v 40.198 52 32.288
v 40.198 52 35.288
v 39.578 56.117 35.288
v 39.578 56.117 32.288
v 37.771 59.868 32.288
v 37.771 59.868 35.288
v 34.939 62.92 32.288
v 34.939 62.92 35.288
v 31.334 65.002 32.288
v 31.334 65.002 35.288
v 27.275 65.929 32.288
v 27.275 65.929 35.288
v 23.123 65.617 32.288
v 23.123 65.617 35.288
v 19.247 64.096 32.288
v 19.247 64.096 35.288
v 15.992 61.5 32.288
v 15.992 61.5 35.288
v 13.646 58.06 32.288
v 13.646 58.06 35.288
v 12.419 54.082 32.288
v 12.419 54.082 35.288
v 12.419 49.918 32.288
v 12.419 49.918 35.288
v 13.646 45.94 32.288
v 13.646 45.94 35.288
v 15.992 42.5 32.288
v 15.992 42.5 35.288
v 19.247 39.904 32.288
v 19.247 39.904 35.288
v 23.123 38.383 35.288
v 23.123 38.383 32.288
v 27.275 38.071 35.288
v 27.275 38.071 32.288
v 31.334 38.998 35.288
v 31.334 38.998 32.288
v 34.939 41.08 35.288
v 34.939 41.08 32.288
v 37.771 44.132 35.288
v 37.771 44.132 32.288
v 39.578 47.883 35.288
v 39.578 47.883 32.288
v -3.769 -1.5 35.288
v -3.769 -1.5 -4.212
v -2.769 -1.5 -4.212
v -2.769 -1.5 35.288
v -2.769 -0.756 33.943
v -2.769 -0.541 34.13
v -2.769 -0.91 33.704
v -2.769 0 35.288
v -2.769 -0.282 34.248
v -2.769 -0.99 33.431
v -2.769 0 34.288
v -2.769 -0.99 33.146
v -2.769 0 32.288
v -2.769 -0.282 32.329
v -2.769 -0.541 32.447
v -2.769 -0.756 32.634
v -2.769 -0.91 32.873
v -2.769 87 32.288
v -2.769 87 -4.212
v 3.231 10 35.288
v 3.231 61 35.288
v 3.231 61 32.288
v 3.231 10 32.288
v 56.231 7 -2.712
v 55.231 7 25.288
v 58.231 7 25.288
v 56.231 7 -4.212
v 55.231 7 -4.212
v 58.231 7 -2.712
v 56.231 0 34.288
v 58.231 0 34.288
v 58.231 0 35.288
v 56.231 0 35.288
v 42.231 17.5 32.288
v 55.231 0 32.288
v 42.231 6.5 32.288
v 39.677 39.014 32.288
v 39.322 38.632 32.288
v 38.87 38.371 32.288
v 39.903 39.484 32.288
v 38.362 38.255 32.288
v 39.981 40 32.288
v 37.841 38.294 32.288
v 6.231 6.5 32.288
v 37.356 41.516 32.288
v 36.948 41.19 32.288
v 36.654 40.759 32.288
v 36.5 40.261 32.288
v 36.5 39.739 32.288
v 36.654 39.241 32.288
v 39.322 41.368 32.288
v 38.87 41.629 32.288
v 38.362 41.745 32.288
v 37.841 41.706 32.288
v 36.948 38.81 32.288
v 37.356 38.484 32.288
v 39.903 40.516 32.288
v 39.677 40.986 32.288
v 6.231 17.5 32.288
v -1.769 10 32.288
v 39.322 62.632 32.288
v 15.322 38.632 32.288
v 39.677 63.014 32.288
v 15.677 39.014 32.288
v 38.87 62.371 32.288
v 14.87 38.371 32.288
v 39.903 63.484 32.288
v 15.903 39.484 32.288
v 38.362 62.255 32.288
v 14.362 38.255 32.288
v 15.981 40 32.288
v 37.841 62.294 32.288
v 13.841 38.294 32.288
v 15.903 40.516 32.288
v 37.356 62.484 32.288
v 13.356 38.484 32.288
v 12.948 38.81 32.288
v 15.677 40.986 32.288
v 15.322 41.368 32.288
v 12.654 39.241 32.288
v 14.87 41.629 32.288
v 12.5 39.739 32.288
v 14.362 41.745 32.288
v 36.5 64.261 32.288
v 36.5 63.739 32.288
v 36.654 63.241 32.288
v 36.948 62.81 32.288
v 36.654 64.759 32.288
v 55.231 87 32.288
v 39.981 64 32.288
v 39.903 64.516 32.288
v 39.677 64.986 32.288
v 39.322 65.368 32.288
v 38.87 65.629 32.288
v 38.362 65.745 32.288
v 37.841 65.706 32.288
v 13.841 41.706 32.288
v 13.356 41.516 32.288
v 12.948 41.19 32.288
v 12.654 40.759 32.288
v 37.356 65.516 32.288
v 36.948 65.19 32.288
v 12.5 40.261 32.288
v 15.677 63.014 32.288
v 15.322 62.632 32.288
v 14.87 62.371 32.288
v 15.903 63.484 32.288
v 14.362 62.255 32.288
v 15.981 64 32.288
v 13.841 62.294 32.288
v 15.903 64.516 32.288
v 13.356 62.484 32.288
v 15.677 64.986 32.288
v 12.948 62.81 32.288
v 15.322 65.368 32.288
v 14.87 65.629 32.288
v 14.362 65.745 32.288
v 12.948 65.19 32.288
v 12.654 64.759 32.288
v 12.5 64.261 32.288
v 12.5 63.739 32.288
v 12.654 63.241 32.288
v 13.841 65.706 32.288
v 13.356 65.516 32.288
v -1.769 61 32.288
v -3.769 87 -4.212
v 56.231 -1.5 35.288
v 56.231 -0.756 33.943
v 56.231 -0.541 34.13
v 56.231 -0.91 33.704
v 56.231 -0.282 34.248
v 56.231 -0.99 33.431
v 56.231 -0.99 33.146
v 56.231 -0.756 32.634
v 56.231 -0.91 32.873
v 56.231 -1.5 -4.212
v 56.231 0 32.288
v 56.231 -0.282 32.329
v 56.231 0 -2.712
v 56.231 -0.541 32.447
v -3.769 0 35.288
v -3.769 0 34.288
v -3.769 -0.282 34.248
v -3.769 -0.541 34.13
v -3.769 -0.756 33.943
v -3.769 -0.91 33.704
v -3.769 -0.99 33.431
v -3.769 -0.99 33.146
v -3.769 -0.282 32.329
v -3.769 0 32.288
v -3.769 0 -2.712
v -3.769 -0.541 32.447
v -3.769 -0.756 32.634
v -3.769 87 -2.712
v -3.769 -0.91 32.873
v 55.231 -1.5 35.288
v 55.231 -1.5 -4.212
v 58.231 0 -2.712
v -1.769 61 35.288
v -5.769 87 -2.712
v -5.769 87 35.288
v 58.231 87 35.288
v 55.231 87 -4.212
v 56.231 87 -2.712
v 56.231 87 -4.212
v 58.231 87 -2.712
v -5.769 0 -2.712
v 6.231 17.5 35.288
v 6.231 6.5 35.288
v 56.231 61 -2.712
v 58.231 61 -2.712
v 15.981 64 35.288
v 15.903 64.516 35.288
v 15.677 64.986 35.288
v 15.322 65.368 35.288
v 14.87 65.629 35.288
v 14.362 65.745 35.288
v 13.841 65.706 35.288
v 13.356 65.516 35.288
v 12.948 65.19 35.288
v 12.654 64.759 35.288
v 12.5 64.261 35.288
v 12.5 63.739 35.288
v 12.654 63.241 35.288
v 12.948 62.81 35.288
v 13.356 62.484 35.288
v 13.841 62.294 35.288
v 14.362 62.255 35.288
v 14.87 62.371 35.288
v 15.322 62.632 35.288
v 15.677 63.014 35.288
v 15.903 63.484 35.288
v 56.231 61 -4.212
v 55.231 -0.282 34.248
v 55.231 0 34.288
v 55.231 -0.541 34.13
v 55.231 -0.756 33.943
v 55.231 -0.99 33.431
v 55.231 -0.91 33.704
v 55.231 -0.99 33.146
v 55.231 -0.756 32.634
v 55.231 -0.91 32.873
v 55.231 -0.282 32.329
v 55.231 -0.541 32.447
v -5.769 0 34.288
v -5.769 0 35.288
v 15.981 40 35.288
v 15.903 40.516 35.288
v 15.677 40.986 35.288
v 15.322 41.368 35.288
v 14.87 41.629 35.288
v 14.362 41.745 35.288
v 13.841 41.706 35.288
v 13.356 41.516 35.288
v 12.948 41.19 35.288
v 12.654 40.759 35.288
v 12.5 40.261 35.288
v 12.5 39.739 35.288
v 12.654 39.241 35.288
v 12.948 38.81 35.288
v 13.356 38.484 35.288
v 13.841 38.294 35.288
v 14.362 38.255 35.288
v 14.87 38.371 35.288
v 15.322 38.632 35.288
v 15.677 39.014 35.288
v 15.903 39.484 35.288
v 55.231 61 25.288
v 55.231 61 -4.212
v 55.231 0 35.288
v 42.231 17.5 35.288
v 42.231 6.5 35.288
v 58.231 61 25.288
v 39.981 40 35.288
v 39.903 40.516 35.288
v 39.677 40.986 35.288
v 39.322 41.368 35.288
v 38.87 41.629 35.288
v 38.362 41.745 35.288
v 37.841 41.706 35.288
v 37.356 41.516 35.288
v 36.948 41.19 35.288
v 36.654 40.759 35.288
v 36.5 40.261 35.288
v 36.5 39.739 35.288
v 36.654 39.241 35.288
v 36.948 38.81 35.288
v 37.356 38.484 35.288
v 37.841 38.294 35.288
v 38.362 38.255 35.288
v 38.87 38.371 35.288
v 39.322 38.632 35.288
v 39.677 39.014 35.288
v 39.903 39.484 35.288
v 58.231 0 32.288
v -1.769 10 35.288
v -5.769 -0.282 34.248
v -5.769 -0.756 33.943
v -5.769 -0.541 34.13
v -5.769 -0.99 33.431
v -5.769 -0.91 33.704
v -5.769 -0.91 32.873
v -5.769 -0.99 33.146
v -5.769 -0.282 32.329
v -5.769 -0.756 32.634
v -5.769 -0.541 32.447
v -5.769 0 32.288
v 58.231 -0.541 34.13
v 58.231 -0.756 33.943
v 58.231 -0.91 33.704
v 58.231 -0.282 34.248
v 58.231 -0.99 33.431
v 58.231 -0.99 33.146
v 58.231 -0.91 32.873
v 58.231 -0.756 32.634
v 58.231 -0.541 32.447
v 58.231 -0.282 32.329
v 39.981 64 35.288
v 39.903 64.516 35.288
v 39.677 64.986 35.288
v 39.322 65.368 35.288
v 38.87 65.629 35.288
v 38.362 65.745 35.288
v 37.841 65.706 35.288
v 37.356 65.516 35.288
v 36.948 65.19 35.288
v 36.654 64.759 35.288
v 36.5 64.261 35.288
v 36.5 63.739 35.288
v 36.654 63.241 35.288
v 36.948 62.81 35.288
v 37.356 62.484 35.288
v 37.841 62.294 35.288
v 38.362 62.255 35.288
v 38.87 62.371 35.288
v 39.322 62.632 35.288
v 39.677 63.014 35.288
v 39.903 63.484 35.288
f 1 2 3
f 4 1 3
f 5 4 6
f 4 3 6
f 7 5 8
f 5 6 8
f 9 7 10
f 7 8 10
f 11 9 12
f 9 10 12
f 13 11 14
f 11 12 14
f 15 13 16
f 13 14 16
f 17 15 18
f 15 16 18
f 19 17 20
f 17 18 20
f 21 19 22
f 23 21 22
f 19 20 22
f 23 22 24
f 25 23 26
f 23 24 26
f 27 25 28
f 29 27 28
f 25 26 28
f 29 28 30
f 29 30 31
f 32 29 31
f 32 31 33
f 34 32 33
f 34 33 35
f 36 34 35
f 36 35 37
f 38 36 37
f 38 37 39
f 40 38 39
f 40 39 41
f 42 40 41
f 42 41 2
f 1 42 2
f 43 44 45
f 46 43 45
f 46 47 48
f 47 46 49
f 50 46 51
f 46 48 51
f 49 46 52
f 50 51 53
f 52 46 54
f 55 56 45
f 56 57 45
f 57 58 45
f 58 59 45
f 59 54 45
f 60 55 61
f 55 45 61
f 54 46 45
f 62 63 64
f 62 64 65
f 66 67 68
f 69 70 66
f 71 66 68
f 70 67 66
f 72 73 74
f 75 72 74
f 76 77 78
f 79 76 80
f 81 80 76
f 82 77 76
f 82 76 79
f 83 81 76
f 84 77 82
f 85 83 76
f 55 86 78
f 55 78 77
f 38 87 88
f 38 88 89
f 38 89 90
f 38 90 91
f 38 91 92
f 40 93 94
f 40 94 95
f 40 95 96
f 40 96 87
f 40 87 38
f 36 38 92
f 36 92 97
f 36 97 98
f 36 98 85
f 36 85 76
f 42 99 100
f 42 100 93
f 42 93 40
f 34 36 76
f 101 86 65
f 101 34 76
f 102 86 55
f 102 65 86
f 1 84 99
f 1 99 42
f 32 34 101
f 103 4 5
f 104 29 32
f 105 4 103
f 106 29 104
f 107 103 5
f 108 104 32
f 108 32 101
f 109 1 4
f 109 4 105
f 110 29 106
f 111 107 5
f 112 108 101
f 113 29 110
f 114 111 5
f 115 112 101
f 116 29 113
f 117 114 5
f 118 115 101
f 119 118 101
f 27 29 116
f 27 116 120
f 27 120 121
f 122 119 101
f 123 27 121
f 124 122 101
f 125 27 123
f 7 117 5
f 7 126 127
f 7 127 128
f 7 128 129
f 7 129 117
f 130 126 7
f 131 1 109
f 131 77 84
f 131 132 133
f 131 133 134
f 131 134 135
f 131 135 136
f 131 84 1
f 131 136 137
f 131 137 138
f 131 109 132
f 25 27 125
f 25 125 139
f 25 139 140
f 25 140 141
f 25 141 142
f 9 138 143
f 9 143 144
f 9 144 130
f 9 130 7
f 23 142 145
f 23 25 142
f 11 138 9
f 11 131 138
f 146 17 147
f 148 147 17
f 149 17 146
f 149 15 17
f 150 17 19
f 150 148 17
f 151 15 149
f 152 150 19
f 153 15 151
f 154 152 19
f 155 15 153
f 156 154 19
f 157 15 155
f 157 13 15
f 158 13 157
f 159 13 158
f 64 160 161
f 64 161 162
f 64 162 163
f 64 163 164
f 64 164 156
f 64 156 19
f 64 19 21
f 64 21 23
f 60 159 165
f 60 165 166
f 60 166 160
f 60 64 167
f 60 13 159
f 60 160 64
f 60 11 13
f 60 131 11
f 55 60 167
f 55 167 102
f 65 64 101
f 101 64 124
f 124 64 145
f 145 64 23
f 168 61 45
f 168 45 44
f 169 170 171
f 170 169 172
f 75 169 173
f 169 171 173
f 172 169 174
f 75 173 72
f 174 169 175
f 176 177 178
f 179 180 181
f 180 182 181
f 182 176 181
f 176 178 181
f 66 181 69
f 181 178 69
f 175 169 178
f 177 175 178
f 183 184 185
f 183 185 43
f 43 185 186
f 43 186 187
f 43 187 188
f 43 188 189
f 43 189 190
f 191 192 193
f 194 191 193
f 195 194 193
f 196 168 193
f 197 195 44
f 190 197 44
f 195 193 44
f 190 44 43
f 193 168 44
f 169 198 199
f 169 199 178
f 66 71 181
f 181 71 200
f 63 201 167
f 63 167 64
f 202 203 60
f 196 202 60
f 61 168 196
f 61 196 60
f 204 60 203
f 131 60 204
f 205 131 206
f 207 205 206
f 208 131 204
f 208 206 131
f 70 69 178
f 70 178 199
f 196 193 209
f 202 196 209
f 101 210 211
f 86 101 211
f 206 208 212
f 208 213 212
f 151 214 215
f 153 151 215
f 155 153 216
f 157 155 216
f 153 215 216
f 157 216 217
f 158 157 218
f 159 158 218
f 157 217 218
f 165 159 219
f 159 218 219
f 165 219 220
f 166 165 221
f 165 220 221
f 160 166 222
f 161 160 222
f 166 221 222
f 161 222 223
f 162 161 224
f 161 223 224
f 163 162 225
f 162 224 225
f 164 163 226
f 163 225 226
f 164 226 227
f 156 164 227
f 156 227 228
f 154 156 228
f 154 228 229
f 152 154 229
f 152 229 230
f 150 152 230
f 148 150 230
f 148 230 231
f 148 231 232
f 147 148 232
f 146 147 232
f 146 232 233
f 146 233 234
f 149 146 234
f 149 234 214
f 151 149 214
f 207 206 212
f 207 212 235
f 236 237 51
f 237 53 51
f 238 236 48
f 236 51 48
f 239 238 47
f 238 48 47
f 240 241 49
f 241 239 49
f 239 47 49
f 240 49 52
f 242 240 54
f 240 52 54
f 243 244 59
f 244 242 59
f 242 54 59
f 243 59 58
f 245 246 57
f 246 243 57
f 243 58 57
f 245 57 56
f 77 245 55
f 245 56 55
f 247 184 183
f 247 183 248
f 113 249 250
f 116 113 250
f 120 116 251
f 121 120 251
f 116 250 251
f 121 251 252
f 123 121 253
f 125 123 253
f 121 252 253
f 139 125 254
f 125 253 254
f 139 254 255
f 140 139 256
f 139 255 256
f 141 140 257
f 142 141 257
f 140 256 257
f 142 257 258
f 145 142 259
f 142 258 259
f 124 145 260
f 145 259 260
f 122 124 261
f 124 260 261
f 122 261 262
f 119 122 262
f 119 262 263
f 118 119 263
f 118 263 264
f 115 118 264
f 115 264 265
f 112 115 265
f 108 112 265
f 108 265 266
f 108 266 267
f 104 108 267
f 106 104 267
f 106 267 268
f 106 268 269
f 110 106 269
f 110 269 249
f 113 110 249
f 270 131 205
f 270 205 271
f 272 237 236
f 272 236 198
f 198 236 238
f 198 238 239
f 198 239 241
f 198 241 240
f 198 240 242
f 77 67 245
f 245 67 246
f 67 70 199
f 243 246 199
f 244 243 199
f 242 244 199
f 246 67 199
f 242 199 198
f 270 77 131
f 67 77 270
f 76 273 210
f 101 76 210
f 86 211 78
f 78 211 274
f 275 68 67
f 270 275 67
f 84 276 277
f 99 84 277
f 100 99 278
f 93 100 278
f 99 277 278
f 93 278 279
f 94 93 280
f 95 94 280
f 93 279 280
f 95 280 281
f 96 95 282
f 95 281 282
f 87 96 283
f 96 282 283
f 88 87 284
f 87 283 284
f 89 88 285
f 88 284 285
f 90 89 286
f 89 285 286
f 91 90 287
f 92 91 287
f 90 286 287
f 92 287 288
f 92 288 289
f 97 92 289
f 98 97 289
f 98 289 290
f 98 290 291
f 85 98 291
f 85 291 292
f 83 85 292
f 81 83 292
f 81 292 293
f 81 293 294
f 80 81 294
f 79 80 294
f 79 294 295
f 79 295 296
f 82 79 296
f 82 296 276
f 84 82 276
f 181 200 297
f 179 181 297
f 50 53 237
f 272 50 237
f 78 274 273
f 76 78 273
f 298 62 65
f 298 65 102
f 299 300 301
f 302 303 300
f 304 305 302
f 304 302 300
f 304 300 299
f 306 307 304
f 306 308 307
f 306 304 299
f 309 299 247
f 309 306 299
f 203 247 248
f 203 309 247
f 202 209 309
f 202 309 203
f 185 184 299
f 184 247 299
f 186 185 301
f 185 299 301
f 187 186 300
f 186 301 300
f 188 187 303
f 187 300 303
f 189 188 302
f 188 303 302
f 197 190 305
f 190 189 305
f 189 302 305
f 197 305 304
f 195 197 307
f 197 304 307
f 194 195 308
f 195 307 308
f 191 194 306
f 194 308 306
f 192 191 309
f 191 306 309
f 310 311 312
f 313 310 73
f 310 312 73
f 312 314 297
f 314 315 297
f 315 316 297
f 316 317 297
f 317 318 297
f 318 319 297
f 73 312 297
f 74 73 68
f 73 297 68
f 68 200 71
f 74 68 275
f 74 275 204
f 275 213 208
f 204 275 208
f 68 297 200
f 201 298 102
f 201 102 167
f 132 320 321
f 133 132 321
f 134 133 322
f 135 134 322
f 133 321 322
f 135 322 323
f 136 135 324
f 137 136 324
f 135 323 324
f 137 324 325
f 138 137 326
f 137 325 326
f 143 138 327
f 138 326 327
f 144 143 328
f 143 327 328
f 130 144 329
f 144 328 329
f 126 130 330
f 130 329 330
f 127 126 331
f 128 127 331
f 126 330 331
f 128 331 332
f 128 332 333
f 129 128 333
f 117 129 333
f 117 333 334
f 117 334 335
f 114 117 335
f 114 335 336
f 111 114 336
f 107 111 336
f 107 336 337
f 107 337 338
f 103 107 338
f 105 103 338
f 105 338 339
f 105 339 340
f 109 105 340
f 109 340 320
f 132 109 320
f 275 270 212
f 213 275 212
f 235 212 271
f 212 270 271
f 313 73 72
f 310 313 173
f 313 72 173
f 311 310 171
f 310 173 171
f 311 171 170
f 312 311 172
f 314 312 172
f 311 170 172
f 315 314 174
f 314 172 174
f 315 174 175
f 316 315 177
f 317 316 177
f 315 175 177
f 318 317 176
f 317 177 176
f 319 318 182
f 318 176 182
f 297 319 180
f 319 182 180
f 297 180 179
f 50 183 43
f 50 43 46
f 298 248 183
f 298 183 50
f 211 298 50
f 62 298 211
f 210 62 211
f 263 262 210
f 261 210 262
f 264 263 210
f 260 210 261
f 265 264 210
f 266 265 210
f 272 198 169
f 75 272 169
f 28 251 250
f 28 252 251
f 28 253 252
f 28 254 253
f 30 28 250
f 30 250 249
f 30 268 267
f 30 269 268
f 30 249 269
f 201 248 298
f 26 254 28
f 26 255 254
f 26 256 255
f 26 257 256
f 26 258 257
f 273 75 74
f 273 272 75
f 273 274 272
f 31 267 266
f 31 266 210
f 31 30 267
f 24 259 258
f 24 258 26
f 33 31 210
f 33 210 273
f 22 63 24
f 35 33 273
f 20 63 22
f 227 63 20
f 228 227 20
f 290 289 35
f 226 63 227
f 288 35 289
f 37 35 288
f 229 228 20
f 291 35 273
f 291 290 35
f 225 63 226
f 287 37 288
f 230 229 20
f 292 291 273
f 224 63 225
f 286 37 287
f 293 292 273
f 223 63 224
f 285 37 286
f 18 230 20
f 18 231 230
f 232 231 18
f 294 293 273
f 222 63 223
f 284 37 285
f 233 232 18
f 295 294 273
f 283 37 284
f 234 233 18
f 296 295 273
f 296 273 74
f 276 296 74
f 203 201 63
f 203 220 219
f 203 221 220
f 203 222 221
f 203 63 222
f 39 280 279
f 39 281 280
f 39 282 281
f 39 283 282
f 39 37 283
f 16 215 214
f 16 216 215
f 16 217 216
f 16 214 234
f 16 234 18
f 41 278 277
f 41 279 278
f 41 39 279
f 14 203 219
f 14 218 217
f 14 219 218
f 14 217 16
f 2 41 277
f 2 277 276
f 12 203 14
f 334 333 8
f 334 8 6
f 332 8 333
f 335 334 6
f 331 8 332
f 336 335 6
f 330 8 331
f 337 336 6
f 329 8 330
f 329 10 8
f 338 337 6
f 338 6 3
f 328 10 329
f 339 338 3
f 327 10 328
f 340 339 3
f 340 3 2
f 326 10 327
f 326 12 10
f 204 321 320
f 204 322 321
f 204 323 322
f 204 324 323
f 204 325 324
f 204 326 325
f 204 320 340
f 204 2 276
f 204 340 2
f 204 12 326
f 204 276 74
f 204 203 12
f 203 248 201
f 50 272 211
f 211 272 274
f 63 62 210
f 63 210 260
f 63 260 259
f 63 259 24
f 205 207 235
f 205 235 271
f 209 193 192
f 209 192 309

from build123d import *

# Parameters (mm, degrees)
EXTRUDE_1_DEPTH      = 88
SKETCH_3_W           = 1.5000000000000007
SKETCH_3_H           = 22
SKETCH_3_W_2         = 1.5
EXTRUDE_2_DEPTH      = 3
CUT_EXTRUDE_1_DEPTH  = 13.000000000000005
CUT_EXTRUDE_2_DEPTH  = 6
SKETCH_7_W           = 1.5
SKETCH_7_H           = 3
SKETCH_7_W_2         = 1.5000000000000007
EXTRUDE_4_DEPTH      = 3
EXTRUDE_START        = -62
SKETCH_6_R           = 1.0000000000000016
EXTRUDE_7_DEPTH      = 62
EXTRUDE_START_2      = 1
EXTRUDE_8_DEPTH      = 1
EXTRUDE_9_DEPTH      = 1
EXTRUDE_10_DEPTH     = 1
EXTRUDE_11_DEPTH     = 1
EXTRUDE_12_DEPTH     = 1
CUT_EXTRUDE_3_DEPTH  = 1
CUT_EXTRUDE_START    = -1
CUT_EXTRUDE_4_DEPTH  = 1
CUT_EXTRUDE_5_DEPTH  = 1
SKETCH_16_W          = 1.500000000000007
SKETCH_16_H          = 25
CUT_EXTRUDE_6_DEPTH  = 1
SKETCH_17_W          = 1.5000000000000004
SKETCH_17_H          = 90
CUT_EXTRUDE_7_DEPTH  = 1
CUT_EXTRUDE_8_DEPTH  = 1
SKETCH_19_W          = 1.500000000000007
SKETCH_19_H          = 26.999999999999993
CUT_EXTRUDE_9_DEPTH  = 1
EXTRUDE_13_DEPTH     = 1
CUT_EXTRUDE_10_DEPTH = 1
CUT_EXTRUDE_11_DEPTH = 1
CUT_EXTRUDE_12_DEPTH = 0.5
CUT_EXTRUDE_13_DEPTH = 0.5
CUT_EXTRUDE_14_DEPTH = 0.5
SKETCH_26_W          = 1.500000000000007
SKETCH_26_H          = 25.999999999999993
CUT_EXTRUDE_15_DEPTH = 0.5
CUT_EXTRUDE_16_DEPTH = 0.5
CUT_EXTRUDE_START_2  = -0.5
CUT_EXTRUDE_17_DEPTH = 0.5
SKETCH_29_W          = 1.4999999999999991
SKETCH_29_H          = 25.999999999999993
CUT_EXTRUDE_18_DEPTH = 0.5
CUT_EXTRUDE_19_DEPTH = 0.5
EXTRUDE_14_DEPTH     = 15
CUT_EXTRUDE_20_DEPTH = 15
SKETCH_33_R          = 1.0000000000000016
CUT_EXTRUDE_21_DEPTH = 114.62339335608438
CUT_EXTRUDE_22_DEPTH = 2
EXTRUDE_15_DEPTH     = 26.00000000000001
EXTRUDE_16_DEPTH     = 26.00000000000001
SKETCH_37_W          = 2.0000000000000004
SKETCH_37_H          = 87
EXTRUDE_17_DEPTH     = 26.00000000000001
EXTRUDE_18_DEPTH     = 28.000000000000025
SKETCH_40_R          = 1.7500000000000038
SKETCH_40_R_2        = 13.967693526781561
SKETCH_40_R_3        = 4.000000000000002
SKETCH_40_R_4        = 4
CUT_EXTRUDE_23_DEPTH = 28.000000000000025
CUT_EXTRUDE_25_DEPTH = 22.000000000000007
SKETCH_43_W          = 11.493047427713066
SKETCH_43_H          = 3
SKETCH_43_W_2        = 11.493047427713059
EXTRUDE_19_DEPTH     = 73.00000000000001
CUT_EXTRUDE_26_DEPTH = 73.00000000000001
EXTRUDE_START_3      = -64
SKETCH_45_R          = 0.9999999999999983
EXTRUDE_21_DEPTH     = 64


with BuildPart() as part:
    # 草图2 → 凸台-拉伸1 (new body)
    with BuildSketch(Plane(origin=(0, 0, 0), x_dir=(1, 0, 0), z_dir=(0, 1, 0))):
        Polygon((-3.2692307692307776, 5.711538461538465), (-3.269230769230777, 2.711538461538465), (-4.769230769230776, 2.711538461538465), (-4.7692307692307745, -19.288461538461533), (57.230769230769226, -19.288461538461533), (57.230769230769226, 2.7115384615384723), (55.73076923076922, 2.7115384615384723), (55.73076923076922, 5.711538461538472), (54.23076923076922, 5.711538461538473), (54.23076923076922, -16.288461538461526), (-1.7692307692307774, -16.288461538461533), (-1.7692307692307776, 5.711538461538466), align=None)
    extrude(amount=EXTRUDE_1_DEPTH)

    # 草图3 → 凸台-拉伸2 (add)
    with BuildSketch(Plane.XZ):
        with Locations((-2.5192307692307776, 5.288461538461534)):
            Rectangle(SKETCH_3_W, SKETCH_3_H)
        with Locations((54.98076923076922, 5.288461538461534)):
            Rectangle(SKETCH_3_W_2, SKETCH_3_H)
    extrude(amount=EXTRUDE_2_DEPTH)

    # 草图4 → 切除-拉伸1 (cut)
    with BuildSketch(Plane(origin=(0, 0, -2.7115384615384723), x_dir=(-1, 0, 0), z_dir=(0, 0, -1))):
        Polygon((-55.73076923076922, 16.689999999999998), (-54.23076923076922, 16.69), (-54.23076923076922, 44.69), (-55.73076923076922, 44.69), align=None)
    extrude(amount=CUT_EXTRUDE_1_DEPTH, mode=Mode.SUBTRACT)

    # 草图5 → 切除-拉伸2 (cut, symmetric)
    with BuildSketch(Plane(origin=(0, 0, -2.7115384615384723), x_dir=(-1, 0, 0), z_dir=(0, 0, -1))):
        Polygon((-57.230769230769226, 8.999999999999995), (-54.23076923076922, 8.999999999999998), (-54.23076923076922, 61), (-57.230769230769226, 61), align=None)
    extrude(amount=CUT_EXTRUDE_2_DEPTH, both=True, mode=Mode.SUBTRACT)

    # 草图7 → 凸台-拉伸4 (add)
    with BuildSketch(Plane.XY.offset(16.288461538461533)):
        with Locations((54.98076923076922, -1.5)):
            Rectangle(SKETCH_7_W, SKETCH_7_H)
        with Locations((-2.5192307692307776, -1.5)):
            Rectangle(SKETCH_7_W_2, SKETCH_7_H)
    extrude(amount=EXTRUDE_4_DEPTH)

    # 草图6 → 凸台-拉伸7 (add)
    with BuildSketch(Plane.ZY.offset(4.769230769230776).offset(EXTRUDE_START)):
        with Locations((17.28846154, 0)):
            Circle(SKETCH_6_R)
    extrude(amount=EXTRUDE_7_DEPTH)

    # 草图8 → 凸台-拉伸8 (add)
    with BuildSketch(Plane(origin=(57.230769230769226, 0, 0), x_dir=(0, 0, -1), z_dir=(1, 0, 0)).offset(EXTRUDE_START_2)):
        with BuildLine():
            Line((-19.288461538461533, 0), (-18.28846154, 0))
            ThreePointArc((-18.28846154, 0), (-17.288461539999997, -1.0000000000000036), (-16.288461539999997, 0))
            Line((-16.288461539999997, 0), (2.7115384615384723, 0))
            Line((2.7115384615384723, 0), (2.7115384615384723, 8.999999999999995))
            Line((2.7115384615384723, 8.999999999999995), (-3.288461538461528, 8.999999999999995))
            Line((-3.288461538461528, 8.999999999999995), (-3.288461538461528, 61))
            Line((-3.288461538461528, 61), (2.711538461538472, 61))
            Line((2.711538461538472, 61), (2.7115384615384723, 88))
            Line((2.7115384615384723, 88), (-19.288461538461533, 88))
            Line((-19.288461538461533, 88), (-19.288461538461533, 0))
        make_face()
    extrude(amount=-EXTRUDE_8_DEPTH)

    # 草图9 → 凸台-拉伸9 (add)
    with BuildSketch(Plane.ZY.offset(4.769230769230776)):
        with BuildLine():
            Line((-2.7115384615384652, 0), (16.28846154, 0))
            ThreePointArc((16.28846154, 0), (17.28846154, -1), (18.288461540000004, 0))
            Line((18.288461540000004, 0), (19.288461538461533, 0))
            Line((19.288461538461533, 0), (19.288461538461533, 88))
            Line((19.288461538461533, 88), (-2.7115384615384652, 88))
            Line((-2.7115384615384652, 88), (-2.7115384615384652, 0))
        make_face()
    extrude(amount=EXTRUDE_9_DEPTH)

    # 草图10 → 凸台-拉伸10 (add)
    with BuildSketch(Plane.ZY.offset(3.2692307692307767)):
        with BuildLine():
            Line((19.288461538461533, 0), (18.288461540000004, 0))
            ThreePointArc((18.288461540000004, 0), (17.28846154, -1), (16.28846154, 1.2e-16))
            Line((16.28846154, 1.2e-16), (-2.7115384615384652, 0))
            Line((-2.7115384615384652, 0), (-2.7115384615384652, 88))
            Line((-2.7115384615384652, 88), (-5.711538461538466, 88))
            Line((-5.711538461538466, 88), (-5.711538461538466, -3))
            Line((-5.711538461538466, -3), (19.288461538461533, -3))
            Line((19.288461538461533, -3), (19.288461538461533, 0))
        make_face()
    extrude(amount=EXTRUDE_10_DEPTH)

    # 草图11 → 凸台-拉伸11 (add)
    with BuildSketch(Plane(origin=(55.73076923076922, 0, 0), x_dir=(0, 0, -1), z_dir=(1, 0, 0)).offset(EXTRUDE_START_2)):
        with BuildLine():
            Line((2.7115384615384723, 0), (-16.288461539999997, 0))
            ThreePointArc((-16.288461539999997, 0), (-17.288461539999997, -1.0000000000000036), (-18.28846154, 1.2e-16))
            Line((-18.28846154, 1.2e-16), (-19.288461538461533, 0))
            Line((-19.288461538461533, 0), (-19.288461538461533, -3))
            Line((-19.288461538461533, -3), (5.711538461538465, -3))
            Line((5.711538461538465, -3), (5.711538461538476, 8.999999999999995))
            Line((5.711538461538476, 8.999999999999995), (2.7115384615384723, 8.999999999999996))
            Line((2.7115384615384723, 8.999999999999996), (2.7115384615384723, 0))
        make_face()
    extrude(amount=-EXTRUDE_11_DEPTH)

    # 草图12 → 凸台-拉伸12 (add)
    with BuildSketch(Plane(origin=(55.73076923076922, 0, 0), x_dir=(0, 0, -1), z_dir=(1, 0, 0))):
        Polygon((2.7115384615384723, 88), (2.7115384615384723, 61), (5.711538461538476, 61), (5.711538461538472, 88), align=None)
    extrude(amount=EXTRUDE_12_DEPTH)

    # 草图13 → 切除-拉伸3 (cut)
    with BuildSketch(Plane(origin=(-1.7692307692307776, 0, 3e-17), x_dir=(-2e-17, 0, -1), z_dir=(1, 0, -2e-17))):
        with BuildLine():
            Line((-16.288461538461533, 88), (-16.28846154, 0))
            ThreePointArc((-16.28846154, 0), (-17.28846154, -1.0000000000000036), (-18.288461540000004, 1.2e-16))
            Line((-18.288461540000004, 1.2e-16), (-19.288461538461533, 0))
            Line((-19.288461538461533, 0), (-19.288461538461533, -3))
            Line((-19.288461538461533, -3), (5.711538461538465, -3))
            Line((5.711538461538465, -3), (5.711538461538466, 88))
            Line((5.711538461538466, 88), (-16.288461538461533, 88))
        make_face()
    extrude(amount=-CUT_EXTRUDE_3_DEPTH, mode=Mode.SUBTRACT)

    # 草图14 → 切除-拉伸4 (cut)
    with BuildSketch(Plane.ZY.offset(-54.23076923076922).offset(CUT_EXTRUDE_START)):
        with BuildLine():
            Line((19.288461538461533, 0), (18.28846154, 0))
            ThreePointArc((18.28846154, 0), (17.288461539999997, -1.0000000003846203), (16.288461539615376, 1.2e-16))
            Line((16.288461539615376, 1.2e-16), (16.288461538461526, 88))
            Line((16.288461538461526, 88), (-5.711538461538473, 88))
            Line((-5.711538461538473, 88), (-5.711538461538476, 61))
            Line((-5.711538461538476, 61), (3.288461538461528, 61))
            Line((3.288461538461528, 61), (3.288461538461528, 8.999999999999998))
            Line((3.288461538461528, 8.999999999999998), (-5.711538461538476, 8.999999999999998))
            Line((-5.711538461538476, 8.999999999999998), (-5.711538461538465, -3))
            Line((-5.711538461538465, -3), (19.288461538461533, -3))
            Line((19.288461538461533, -3), (19.288461538461533, 0))
        make_face()
    extrude(amount=CUT_EXTRUDE_4_DEPTH, mode=Mode.SUBTRACT)

    # 草图15 → 切除-拉伸5 (cut)
    with BuildSketch(Plane.XZ.offset(3)):
        Polygon((-2.7692307692307776, -5.711538461538465), (-2.769230769230777, 19.288461538461533), (-4.2692307692307745, 19.288461538461533), (-4.269230769230778, -5.711538461538465), align=None)
    extrude(amount=-CUT_EXTRUDE_5_DEPTH, mode=Mode.SUBTRACT)

    # 草图16 → 切除-拉伸6 (cut)
    with BuildSketch(Plane.XZ.offset(3)):
        with Locations((55.980769230769226, 6.788461538461534)):
            Rectangle(SKETCH_16_W, SKETCH_16_H)
    extrude(amount=-CUT_EXTRUDE_6_DEPTH, mode=Mode.SUBTRACT)

    # 草图17 → 切除-拉伸7 (cut)
    with BuildSketch(Plane(origin=(-3.3e-15, 0, -5.711538461538467), x_dir=(-1, 0, 5.8e-16), z_dir=(-5.8e-16, 0, -1))):
        with Locations((3.5192307692307745, 43)):
            Rectangle(SKETCH_17_W, SKETCH_17_H)
    extrude(amount=-CUT_EXTRUDE_7_DEPTH, mode=Mode.SUBTRACT)

    # 草图18 → 切除-拉伸8 (cut)
    with BuildSketch(Plane(origin=(3.3e-15, 0, -5.711538461538505), x_dir=(-1, 0, -5.8e-16), z_dir=(5.8e-16, 0, -1))):
        Polygon((-56.730769230769226, -2), (-55.23076923076922, -2), (-55.23076923076922, 8.999999999999998), (-56.730769230769226, 8.999999999999995), align=None)
    extrude(amount=-CUT_EXTRUDE_8_DEPTH, mode=Mode.SUBTRACT)

    # 草图19 → 切除-拉伸9 (cut)
    with BuildSketch(Plane(origin=(3.3e-15, 0, -5.711538461538505), x_dir=(-1, 0, -5.8e-16), z_dir=(5.8e-16, 0, -1))):
        with Locations((-55.980769230769226, 74.5)):
            Rectangle(SKETCH_19_W, SKETCH_19_H)
    extrude(amount=-CUT_EXTRUDE_9_DEPTH, mode=Mode.SUBTRACT)

    # 草图20 → 凸台-拉伸13 (add)
    with BuildSketch(Plane.XY.offset(19.288461538461533)):
        Polygon((55.23076923076922, -2), (56.730769230769226, -2), (56.730769230769226, 0), (58.230769230769226, 0), (58.230769230769226, 88), (-5.7692307692307745, 88), (-5.7692307692307745, 0), (-4.2692307692307745, 0), (-4.2692307692307745, -2), (-2.769230769230777, -2), (-2.769230769230777, 0), (55.23076923076922, 0), align=None)
    extrude(amount=EXTRUDE_13_DEPTH)

    # 草图21 → 切除-拉伸10 (cut)
    with BuildSketch(Plane(origin=(2.02e-15, 0, 16.288461538461533), x_dir=(-1, 0, 1.2e-16), z_dir=(-1.2e-16, 0, -1))):
        Polygon((-55.23076923076922, 1.2e-16), (2.7692307692307794, 0), (2.7692307692307794, 88), (-55.23076923076922, 88), align=None)
    extrude(amount=-CUT_EXTRUDE_10_DEPTH, mode=Mode.SUBTRACT)

    # 草图22 → 切除-拉伸11 (cut)
    with BuildSketch(Plane(origin=(0, 88, 0), x_dir=(1, 0, 0), z_dir=(0, 1, 0))):
        Polygon((55.23076923076922, 4.711538461538472), (55.23076923076922, -17.288461538461526), (-2.769230769230777, -17.288461538461533), (-2.769230769230777, 4.711538461538465), (-4.269230769230777, 4.711538461538464), (-4.269230769230776, 2.711538461538465), (-5.769230769230776, 2.711538461538465), (-5.7692307692307745, -20.288461538461533), (58.230769230769226, -20.288461538461533), (58.230769230769226, 2.7115384615384723), (56.730769230769226, 2.7115384615384723), (56.730769230769226, 4.7115384615384714), align=None)
    extrude(amount=-CUT_EXTRUDE_11_DEPTH, mode=Mode.SUBTRACT)

    # 草图23 → 切除-拉伸12 (cut)
    with BuildSketch(Plane.XZ.offset(2)):
        Polygon((-4.2692307692307745, 20.288461538461533), (-4.269230769230777, -4.711538461538464), (-2.7692307692307776, -4.711538461538465), (-2.769230769230777, 20.288461538461533), align=None)
    extrude(amount=-CUT_EXTRUDE_12_DEPTH, mode=Mode.SUBTRACT)

    # 草图24 → 切除-拉伸13 (cut)
    with BuildSketch(Plane.XZ.offset(2)):
        Polygon((55.23076923076922, 20.288461538461533), (55.23076923076922, -4.711538461538472), (56.730769230769226, -4.7115384615384714), (56.730769230769226, 20.288461538461533), align=None)
    extrude(amount=-CUT_EXTRUDE_13_DEPTH, mode=Mode.SUBTRACT)

    # 草图25 → 切除-拉伸14 (cut)
    with BuildSketch(Plane(origin=(-2.72e-15, 0, -4.711538461538467), x_dir=(-1, 0, 5.8e-16), z_dir=(-5.8e-16, 0, -1))):
        Polygon((2.7692307692307745, 87), (2.769230769230775, -1.5), (4.2692307692307745, -1.5), (4.2692307692307745, 87), align=None)
    extrude(amount=-CUT_EXTRUDE_14_DEPTH, mode=Mode.SUBTRACT)

    # 草图26 → 切除-拉伸15 (cut)
    with BuildSketch(Plane(origin=(2.72e-15, 0, -4.711538461538505), x_dir=(-1, 0, -5.8e-16), z_dir=(5.8e-16, 0, -1))):
        with Locations((-55.980769230769226, 74)):
            Rectangle(SKETCH_26_W, SKETCH_26_H)
    extrude(amount=-CUT_EXTRUDE_15_DEPTH, mode=Mode.SUBTRACT)

    # 草图27 → 切除-拉伸16 (cut)
    with BuildSketch(Plane(origin=(2.72e-15, 0, -4.711538461538505), x_dir=(-1, 0, -5.8e-16), z_dir=(5.8e-16, 0, -1))):
        Polygon((-56.730769230769226, 8.999999999999995), (-56.730769230769226, -1.5), (-55.23076923076922, -1.5), (-55.23076923076922, 8.999999999999998), align=None)
    extrude(amount=-CUT_EXTRUDE_16_DEPTH, mode=Mode.SUBTRACT)

    # 草图28 → 切除-拉伸17 (cut)
    with BuildSketch(Plane.ZY.offset(4.269230769230777).offset(CUT_EXTRUDE_START_2)):
        with BuildLine():
            Line((-2.7115384615384652, 87), (-4.211538461538465, 87))
            Line((-4.211538461538465, 87), (-4.211538461538465, -1.5))
            Line((-4.211538461538465, -1.5), (20.288461538461533, -1.5))
            Line((20.288461538461533, -1.5), (20.288461538461533, 0))
            Line((20.288461538461533, 0), (18.288461540000004, 0))
            ThreePointArc((18.288461540000004, 0), (17.28846154, -1), (16.28846154, 1.2e-16))
            Line((16.28846154, 1.2e-16), (-2.7115384615384652, 0))
            Line((-2.7115384615384652, 0), (-2.7115384615384652, 87))
        make_face()
    extrude(amount=CUT_EXTRUDE_17_DEPTH, mode=Mode.SUBTRACT)

    # 草图29 → 切除-拉伸18 (cut)
    with BuildSketch(Plane(origin=(56.730769230769226, 0, 0), x_dir=(0, 0, -1), z_dir=(1, 0, 0))):
        with Locations((3.461538461538472, 74)):
            Rectangle(SKETCH_29_W, SKETCH_29_H)
    extrude(amount=-CUT_EXTRUDE_18_DEPTH, mode=Mode.SUBTRACT)

    # 草图30 → 切除-拉伸19 (cut)
    with BuildSketch(Plane(origin=(56.730769230769226, 0, 0), x_dir=(0, 0, -1), z_dir=(1, 0, 0))):
        with BuildLine():
            Line((-20.288461538461533, -1.5), (4.2115384615384714, -1.5))
            Line((4.2115384615384714, -1.5), (4.2115384615384714, 8.999999999999995))
            Line((4.2115384615384714, 8.999999999999995), (2.7115384615384723, 8.999999999999995))
            Line((2.7115384615384723, 8.999999999999995), (2.7115384615384723, 0))
            Line((2.7115384615384723, 0), (-16.288461539999997, 0))
            ThreePointArc((-16.288461539999997, 0), (-17.288461539999997, -1.0000000000000036), (-18.28846154, 1.2e-16))
            Line((-18.28846154, 1.2e-16), (-20.288461538461533, 0))
            Line((-20.288461538461533, 0), (-20.288461538461533, -1.5))
        make_face()
    extrude(amount=-CUT_EXTRUDE_19_DEPTH, mode=Mode.SUBTRACT)

    # 草图31 → 凸台-拉伸14 (add)
    with BuildSketch(Plane.XY.offset(20.288461538461533)):
        Polygon((56.230769230769226, -1.5), (56.230769230769226, 0), (58.230769230769226, 0), (58.230769230769226, 87), (-5.7692307692307745, 87), (-5.7692307692307745, 0), (-3.7692307692307745, 0), (-3.7692307692307745, -1.5), (-2.769230769230777, -1.5), (-2.769230769230777, 0), (55.23076923076922, 0), (55.23076923076922, -1.5), align=None)
    extrude(amount=EXTRUDE_14_DEPTH)

    # 草图32 → 切除-拉伸20 (cut)
    with BuildSketch(Plane(origin=(2.07e-15, 0, 17.288461538461533), x_dir=(-1, 0, 1.2e-16), z_dir=(-1.2e-16, 0, -1))):
        Polygon((2.7692307692307794, 0), (2.7692307692307794, 87), (-55.23076923076922, 87), (-55.23076923076922, 1.2e-16), align=None)
    extrude(amount=-CUT_EXTRUDE_20_DEPTH, mode=Mode.SUBTRACT)

    # 草图33 → 切除-拉伸21 (cut, through all)
    with BuildSketch(Plane.ZY.offset(5.769230769230776)):
        with Locations((17.28846154, 0)):
            Circle(SKETCH_33_R)
    extrude(amount=-CUT_EXTRUDE_21_DEPTH, mode=Mode.SUBTRACT)

    # 草图34 → 切除-拉伸22 (cut)
    with BuildSketch(Plane(origin=(1.041e-14, 9.00000000000006, 0), x_dir=(1, -1.16e-15, 0), z_dir=(1.16e-15, 1, 0))):
        Polygon((58.23076923076922, 2.7115384615384723), (56.23076923076922, 2.7115384615384723), (56.23076923076922, 4.2115384615384714), (55.23076923076921, 4.211538461538473), (55.23076923076921, -3.288461538461528), (58.23076923076922, -3.288461538461528), align=None)
    extrude(amount=-CUT_EXTRUDE_22_DEPTH, mode=Mode.SUBTRACT)

    # 草图35 → 凸台-拉伸15 (add)
    with BuildSketch(Plane(origin=(0, 0, -2.7115384615384723), x_dir=(-1, 0, 0), z_dir=(0, 0, -1))):
        Polygon((-56.230769230769226, 6.999999999999996), (-58.23076923076923, 6.999999999999992), (-58.230769230769226, 0), (-56.230769230769226, 0), align=None)
    extrude(amount=-EXTRUDE_15_DEPTH)

    # 草图36 → 凸台-拉伸16 (add)
    with BuildSketch(Plane(origin=(2.44e-15, 0, -4.211538461538504), x_dir=(-1, 0, -5.8e-16), z_dir=(5.8e-16, 0, -1))):
        Polygon((-55.23076923076922, -1.5), (-55.230769230769226, 6.999999999999996), (-56.23076923076923, 6.999999999999996), (-56.230769230769226, -1.5), align=None)
    extrude(amount=-EXTRUDE_16_DEPTH)

    # 草图37 → 凸台-拉伸17 (add)
    with BuildSketch(Plane(origin=(0, 0, -2.711538461538465), x_dir=(-1, 0, 0), z_dir=(0, 0, -1))):
        with Locations((4.769230769230777, 43.5)):
            Rectangle(SKETCH_37_W, SKETCH_37_H)
    extrude(amount=-EXTRUDE_17_DEPTH)

    # 草图38 → 凸台-拉伸18 (add)
    with BuildSketch(Plane(origin=(-2.44e-15, 0, -4.211538461538466), x_dir=(-1, 0, 5.8e-16), z_dir=(-5.8e-16, 0, -1))):
        Polygon((2.769230769230775, -1.5), (3.769230769230775, -1.5), (3.7692307692307745, 87), (2.769230769230774, 87), align=None)
    extrude(amount=-EXTRUDE_18_DEPTH)

    # 草图40 → 切除-拉伸23 (cut)
    with BuildSketch(Plane.XY.offset(35.28846153846153)):
        with Locations((38.23076923076923, 64)):
            Circle(SKETCH_40_R)
        with Locations((38.23076923076923, 40.00000000000002)):
            Circle(SKETCH_40_R)
        with Locations((14.23076923076921, 40.00000000000002)):
            Circle(SKETCH_40_R)
        with Locations((14.23076923076921, 64)):
            Circle(SKETCH_40_R)
        with Locations((26.230769230769226, 52.000000000000014)):
            Circle(SKETCH_40_R_2)
        with Locations((6.236788059331033, 52.000000000000014)):
            Circle(SKETCH_40_R_3)
        with Locations((6.236788059331033, 75.99999999999999)):
            Circle(SKETCH_40_R_3)
        with Locations((6.236788059331033, 28.000000000000032)):
            Circle(SKETCH_40_R_3)
        with Locations((46.224750402207405, 28.000000000000032)):
            Circle(SKETCH_40_R_4)
        with Locations((46.22475040220741, 52.000000000000014)):
            Circle(SKETCH_40_R_4)
        with Locations((46.22475040220741, 75.99999999999999)):
            Circle(SKETCH_40_R_4)
    extrude(amount=-CUT_EXTRUDE_23_DEPTH, mode=Mode.SUBTRACT)

    # 草图41 → 切除-拉伸25 (cut)
    with BuildSketch(Plane(origin=(0, 0, 3.288461538461528), x_dir=(-1, 0, 0), z_dir=(0, 0, -1))):
        Polygon((-55.230769230769226, 6.999999999999996), (-55.23076923076922, 61), (-58.230769230769226, 61), (-58.23076923076923, 6.999999999999992), align=None)
    extrude(amount=-CUT_EXTRUDE_25_DEPTH, mode=Mode.SUBTRACT)

    # 草图43 → 凸台-拉伸19 (add)
    with BuildSketch(Plane(origin=(0, 87, 0), x_dir=(1, 0, 0), z_dir=(0, 1, 0))):
        with Locations((5.746523713856533, -33.78846153846153)):
            Rectangle(SKETCH_43_W, SKETCH_43_H)
        with Locations((46.95722324843743, -33.78846153846153)):
            Rectangle(SKETCH_43_W_2, SKETCH_43_H)
    extrude(amount=-EXTRUDE_19_DEPTH)

    # 草图44 → 切除-拉伸26 (cut)
    with BuildSketch(Plane.XY.offset(35.28846153846153)):
        Polygon((42.23076923076923, 17.5), (6.230769230769234, 17.499999999999996), (6.230769230769234, 6.4999999999999964), (42.23076923076923, 6.500000000000001), align=None)
        Polygon((-1.7692307692307747, 60.99999999999999), (3.230769230769228, 60.99999999999999), (3.2307692307692415, 9.999999999999996), (-1.7692307692307683, 9.999999999999995), align=None)
    extrude(amount=-CUT_EXTRUDE_26_DEPTH, mode=Mode.SUBTRACT)

    # 草图45 → 凸台-拉伸21 (add)
    with BuildSketch(Plane(origin=(58.230769230769226, 0, 0), x_dir=(0, 0, -1), z_dir=(1, 0, 0)).offset(EXTRUDE_START_3)):
        with Locations((-33.28846153846153, 0)):
            Circle(SKETCH_45_R)
    extrude(amount=EXTRUDE_21_DEPTH)


solid = part.part
